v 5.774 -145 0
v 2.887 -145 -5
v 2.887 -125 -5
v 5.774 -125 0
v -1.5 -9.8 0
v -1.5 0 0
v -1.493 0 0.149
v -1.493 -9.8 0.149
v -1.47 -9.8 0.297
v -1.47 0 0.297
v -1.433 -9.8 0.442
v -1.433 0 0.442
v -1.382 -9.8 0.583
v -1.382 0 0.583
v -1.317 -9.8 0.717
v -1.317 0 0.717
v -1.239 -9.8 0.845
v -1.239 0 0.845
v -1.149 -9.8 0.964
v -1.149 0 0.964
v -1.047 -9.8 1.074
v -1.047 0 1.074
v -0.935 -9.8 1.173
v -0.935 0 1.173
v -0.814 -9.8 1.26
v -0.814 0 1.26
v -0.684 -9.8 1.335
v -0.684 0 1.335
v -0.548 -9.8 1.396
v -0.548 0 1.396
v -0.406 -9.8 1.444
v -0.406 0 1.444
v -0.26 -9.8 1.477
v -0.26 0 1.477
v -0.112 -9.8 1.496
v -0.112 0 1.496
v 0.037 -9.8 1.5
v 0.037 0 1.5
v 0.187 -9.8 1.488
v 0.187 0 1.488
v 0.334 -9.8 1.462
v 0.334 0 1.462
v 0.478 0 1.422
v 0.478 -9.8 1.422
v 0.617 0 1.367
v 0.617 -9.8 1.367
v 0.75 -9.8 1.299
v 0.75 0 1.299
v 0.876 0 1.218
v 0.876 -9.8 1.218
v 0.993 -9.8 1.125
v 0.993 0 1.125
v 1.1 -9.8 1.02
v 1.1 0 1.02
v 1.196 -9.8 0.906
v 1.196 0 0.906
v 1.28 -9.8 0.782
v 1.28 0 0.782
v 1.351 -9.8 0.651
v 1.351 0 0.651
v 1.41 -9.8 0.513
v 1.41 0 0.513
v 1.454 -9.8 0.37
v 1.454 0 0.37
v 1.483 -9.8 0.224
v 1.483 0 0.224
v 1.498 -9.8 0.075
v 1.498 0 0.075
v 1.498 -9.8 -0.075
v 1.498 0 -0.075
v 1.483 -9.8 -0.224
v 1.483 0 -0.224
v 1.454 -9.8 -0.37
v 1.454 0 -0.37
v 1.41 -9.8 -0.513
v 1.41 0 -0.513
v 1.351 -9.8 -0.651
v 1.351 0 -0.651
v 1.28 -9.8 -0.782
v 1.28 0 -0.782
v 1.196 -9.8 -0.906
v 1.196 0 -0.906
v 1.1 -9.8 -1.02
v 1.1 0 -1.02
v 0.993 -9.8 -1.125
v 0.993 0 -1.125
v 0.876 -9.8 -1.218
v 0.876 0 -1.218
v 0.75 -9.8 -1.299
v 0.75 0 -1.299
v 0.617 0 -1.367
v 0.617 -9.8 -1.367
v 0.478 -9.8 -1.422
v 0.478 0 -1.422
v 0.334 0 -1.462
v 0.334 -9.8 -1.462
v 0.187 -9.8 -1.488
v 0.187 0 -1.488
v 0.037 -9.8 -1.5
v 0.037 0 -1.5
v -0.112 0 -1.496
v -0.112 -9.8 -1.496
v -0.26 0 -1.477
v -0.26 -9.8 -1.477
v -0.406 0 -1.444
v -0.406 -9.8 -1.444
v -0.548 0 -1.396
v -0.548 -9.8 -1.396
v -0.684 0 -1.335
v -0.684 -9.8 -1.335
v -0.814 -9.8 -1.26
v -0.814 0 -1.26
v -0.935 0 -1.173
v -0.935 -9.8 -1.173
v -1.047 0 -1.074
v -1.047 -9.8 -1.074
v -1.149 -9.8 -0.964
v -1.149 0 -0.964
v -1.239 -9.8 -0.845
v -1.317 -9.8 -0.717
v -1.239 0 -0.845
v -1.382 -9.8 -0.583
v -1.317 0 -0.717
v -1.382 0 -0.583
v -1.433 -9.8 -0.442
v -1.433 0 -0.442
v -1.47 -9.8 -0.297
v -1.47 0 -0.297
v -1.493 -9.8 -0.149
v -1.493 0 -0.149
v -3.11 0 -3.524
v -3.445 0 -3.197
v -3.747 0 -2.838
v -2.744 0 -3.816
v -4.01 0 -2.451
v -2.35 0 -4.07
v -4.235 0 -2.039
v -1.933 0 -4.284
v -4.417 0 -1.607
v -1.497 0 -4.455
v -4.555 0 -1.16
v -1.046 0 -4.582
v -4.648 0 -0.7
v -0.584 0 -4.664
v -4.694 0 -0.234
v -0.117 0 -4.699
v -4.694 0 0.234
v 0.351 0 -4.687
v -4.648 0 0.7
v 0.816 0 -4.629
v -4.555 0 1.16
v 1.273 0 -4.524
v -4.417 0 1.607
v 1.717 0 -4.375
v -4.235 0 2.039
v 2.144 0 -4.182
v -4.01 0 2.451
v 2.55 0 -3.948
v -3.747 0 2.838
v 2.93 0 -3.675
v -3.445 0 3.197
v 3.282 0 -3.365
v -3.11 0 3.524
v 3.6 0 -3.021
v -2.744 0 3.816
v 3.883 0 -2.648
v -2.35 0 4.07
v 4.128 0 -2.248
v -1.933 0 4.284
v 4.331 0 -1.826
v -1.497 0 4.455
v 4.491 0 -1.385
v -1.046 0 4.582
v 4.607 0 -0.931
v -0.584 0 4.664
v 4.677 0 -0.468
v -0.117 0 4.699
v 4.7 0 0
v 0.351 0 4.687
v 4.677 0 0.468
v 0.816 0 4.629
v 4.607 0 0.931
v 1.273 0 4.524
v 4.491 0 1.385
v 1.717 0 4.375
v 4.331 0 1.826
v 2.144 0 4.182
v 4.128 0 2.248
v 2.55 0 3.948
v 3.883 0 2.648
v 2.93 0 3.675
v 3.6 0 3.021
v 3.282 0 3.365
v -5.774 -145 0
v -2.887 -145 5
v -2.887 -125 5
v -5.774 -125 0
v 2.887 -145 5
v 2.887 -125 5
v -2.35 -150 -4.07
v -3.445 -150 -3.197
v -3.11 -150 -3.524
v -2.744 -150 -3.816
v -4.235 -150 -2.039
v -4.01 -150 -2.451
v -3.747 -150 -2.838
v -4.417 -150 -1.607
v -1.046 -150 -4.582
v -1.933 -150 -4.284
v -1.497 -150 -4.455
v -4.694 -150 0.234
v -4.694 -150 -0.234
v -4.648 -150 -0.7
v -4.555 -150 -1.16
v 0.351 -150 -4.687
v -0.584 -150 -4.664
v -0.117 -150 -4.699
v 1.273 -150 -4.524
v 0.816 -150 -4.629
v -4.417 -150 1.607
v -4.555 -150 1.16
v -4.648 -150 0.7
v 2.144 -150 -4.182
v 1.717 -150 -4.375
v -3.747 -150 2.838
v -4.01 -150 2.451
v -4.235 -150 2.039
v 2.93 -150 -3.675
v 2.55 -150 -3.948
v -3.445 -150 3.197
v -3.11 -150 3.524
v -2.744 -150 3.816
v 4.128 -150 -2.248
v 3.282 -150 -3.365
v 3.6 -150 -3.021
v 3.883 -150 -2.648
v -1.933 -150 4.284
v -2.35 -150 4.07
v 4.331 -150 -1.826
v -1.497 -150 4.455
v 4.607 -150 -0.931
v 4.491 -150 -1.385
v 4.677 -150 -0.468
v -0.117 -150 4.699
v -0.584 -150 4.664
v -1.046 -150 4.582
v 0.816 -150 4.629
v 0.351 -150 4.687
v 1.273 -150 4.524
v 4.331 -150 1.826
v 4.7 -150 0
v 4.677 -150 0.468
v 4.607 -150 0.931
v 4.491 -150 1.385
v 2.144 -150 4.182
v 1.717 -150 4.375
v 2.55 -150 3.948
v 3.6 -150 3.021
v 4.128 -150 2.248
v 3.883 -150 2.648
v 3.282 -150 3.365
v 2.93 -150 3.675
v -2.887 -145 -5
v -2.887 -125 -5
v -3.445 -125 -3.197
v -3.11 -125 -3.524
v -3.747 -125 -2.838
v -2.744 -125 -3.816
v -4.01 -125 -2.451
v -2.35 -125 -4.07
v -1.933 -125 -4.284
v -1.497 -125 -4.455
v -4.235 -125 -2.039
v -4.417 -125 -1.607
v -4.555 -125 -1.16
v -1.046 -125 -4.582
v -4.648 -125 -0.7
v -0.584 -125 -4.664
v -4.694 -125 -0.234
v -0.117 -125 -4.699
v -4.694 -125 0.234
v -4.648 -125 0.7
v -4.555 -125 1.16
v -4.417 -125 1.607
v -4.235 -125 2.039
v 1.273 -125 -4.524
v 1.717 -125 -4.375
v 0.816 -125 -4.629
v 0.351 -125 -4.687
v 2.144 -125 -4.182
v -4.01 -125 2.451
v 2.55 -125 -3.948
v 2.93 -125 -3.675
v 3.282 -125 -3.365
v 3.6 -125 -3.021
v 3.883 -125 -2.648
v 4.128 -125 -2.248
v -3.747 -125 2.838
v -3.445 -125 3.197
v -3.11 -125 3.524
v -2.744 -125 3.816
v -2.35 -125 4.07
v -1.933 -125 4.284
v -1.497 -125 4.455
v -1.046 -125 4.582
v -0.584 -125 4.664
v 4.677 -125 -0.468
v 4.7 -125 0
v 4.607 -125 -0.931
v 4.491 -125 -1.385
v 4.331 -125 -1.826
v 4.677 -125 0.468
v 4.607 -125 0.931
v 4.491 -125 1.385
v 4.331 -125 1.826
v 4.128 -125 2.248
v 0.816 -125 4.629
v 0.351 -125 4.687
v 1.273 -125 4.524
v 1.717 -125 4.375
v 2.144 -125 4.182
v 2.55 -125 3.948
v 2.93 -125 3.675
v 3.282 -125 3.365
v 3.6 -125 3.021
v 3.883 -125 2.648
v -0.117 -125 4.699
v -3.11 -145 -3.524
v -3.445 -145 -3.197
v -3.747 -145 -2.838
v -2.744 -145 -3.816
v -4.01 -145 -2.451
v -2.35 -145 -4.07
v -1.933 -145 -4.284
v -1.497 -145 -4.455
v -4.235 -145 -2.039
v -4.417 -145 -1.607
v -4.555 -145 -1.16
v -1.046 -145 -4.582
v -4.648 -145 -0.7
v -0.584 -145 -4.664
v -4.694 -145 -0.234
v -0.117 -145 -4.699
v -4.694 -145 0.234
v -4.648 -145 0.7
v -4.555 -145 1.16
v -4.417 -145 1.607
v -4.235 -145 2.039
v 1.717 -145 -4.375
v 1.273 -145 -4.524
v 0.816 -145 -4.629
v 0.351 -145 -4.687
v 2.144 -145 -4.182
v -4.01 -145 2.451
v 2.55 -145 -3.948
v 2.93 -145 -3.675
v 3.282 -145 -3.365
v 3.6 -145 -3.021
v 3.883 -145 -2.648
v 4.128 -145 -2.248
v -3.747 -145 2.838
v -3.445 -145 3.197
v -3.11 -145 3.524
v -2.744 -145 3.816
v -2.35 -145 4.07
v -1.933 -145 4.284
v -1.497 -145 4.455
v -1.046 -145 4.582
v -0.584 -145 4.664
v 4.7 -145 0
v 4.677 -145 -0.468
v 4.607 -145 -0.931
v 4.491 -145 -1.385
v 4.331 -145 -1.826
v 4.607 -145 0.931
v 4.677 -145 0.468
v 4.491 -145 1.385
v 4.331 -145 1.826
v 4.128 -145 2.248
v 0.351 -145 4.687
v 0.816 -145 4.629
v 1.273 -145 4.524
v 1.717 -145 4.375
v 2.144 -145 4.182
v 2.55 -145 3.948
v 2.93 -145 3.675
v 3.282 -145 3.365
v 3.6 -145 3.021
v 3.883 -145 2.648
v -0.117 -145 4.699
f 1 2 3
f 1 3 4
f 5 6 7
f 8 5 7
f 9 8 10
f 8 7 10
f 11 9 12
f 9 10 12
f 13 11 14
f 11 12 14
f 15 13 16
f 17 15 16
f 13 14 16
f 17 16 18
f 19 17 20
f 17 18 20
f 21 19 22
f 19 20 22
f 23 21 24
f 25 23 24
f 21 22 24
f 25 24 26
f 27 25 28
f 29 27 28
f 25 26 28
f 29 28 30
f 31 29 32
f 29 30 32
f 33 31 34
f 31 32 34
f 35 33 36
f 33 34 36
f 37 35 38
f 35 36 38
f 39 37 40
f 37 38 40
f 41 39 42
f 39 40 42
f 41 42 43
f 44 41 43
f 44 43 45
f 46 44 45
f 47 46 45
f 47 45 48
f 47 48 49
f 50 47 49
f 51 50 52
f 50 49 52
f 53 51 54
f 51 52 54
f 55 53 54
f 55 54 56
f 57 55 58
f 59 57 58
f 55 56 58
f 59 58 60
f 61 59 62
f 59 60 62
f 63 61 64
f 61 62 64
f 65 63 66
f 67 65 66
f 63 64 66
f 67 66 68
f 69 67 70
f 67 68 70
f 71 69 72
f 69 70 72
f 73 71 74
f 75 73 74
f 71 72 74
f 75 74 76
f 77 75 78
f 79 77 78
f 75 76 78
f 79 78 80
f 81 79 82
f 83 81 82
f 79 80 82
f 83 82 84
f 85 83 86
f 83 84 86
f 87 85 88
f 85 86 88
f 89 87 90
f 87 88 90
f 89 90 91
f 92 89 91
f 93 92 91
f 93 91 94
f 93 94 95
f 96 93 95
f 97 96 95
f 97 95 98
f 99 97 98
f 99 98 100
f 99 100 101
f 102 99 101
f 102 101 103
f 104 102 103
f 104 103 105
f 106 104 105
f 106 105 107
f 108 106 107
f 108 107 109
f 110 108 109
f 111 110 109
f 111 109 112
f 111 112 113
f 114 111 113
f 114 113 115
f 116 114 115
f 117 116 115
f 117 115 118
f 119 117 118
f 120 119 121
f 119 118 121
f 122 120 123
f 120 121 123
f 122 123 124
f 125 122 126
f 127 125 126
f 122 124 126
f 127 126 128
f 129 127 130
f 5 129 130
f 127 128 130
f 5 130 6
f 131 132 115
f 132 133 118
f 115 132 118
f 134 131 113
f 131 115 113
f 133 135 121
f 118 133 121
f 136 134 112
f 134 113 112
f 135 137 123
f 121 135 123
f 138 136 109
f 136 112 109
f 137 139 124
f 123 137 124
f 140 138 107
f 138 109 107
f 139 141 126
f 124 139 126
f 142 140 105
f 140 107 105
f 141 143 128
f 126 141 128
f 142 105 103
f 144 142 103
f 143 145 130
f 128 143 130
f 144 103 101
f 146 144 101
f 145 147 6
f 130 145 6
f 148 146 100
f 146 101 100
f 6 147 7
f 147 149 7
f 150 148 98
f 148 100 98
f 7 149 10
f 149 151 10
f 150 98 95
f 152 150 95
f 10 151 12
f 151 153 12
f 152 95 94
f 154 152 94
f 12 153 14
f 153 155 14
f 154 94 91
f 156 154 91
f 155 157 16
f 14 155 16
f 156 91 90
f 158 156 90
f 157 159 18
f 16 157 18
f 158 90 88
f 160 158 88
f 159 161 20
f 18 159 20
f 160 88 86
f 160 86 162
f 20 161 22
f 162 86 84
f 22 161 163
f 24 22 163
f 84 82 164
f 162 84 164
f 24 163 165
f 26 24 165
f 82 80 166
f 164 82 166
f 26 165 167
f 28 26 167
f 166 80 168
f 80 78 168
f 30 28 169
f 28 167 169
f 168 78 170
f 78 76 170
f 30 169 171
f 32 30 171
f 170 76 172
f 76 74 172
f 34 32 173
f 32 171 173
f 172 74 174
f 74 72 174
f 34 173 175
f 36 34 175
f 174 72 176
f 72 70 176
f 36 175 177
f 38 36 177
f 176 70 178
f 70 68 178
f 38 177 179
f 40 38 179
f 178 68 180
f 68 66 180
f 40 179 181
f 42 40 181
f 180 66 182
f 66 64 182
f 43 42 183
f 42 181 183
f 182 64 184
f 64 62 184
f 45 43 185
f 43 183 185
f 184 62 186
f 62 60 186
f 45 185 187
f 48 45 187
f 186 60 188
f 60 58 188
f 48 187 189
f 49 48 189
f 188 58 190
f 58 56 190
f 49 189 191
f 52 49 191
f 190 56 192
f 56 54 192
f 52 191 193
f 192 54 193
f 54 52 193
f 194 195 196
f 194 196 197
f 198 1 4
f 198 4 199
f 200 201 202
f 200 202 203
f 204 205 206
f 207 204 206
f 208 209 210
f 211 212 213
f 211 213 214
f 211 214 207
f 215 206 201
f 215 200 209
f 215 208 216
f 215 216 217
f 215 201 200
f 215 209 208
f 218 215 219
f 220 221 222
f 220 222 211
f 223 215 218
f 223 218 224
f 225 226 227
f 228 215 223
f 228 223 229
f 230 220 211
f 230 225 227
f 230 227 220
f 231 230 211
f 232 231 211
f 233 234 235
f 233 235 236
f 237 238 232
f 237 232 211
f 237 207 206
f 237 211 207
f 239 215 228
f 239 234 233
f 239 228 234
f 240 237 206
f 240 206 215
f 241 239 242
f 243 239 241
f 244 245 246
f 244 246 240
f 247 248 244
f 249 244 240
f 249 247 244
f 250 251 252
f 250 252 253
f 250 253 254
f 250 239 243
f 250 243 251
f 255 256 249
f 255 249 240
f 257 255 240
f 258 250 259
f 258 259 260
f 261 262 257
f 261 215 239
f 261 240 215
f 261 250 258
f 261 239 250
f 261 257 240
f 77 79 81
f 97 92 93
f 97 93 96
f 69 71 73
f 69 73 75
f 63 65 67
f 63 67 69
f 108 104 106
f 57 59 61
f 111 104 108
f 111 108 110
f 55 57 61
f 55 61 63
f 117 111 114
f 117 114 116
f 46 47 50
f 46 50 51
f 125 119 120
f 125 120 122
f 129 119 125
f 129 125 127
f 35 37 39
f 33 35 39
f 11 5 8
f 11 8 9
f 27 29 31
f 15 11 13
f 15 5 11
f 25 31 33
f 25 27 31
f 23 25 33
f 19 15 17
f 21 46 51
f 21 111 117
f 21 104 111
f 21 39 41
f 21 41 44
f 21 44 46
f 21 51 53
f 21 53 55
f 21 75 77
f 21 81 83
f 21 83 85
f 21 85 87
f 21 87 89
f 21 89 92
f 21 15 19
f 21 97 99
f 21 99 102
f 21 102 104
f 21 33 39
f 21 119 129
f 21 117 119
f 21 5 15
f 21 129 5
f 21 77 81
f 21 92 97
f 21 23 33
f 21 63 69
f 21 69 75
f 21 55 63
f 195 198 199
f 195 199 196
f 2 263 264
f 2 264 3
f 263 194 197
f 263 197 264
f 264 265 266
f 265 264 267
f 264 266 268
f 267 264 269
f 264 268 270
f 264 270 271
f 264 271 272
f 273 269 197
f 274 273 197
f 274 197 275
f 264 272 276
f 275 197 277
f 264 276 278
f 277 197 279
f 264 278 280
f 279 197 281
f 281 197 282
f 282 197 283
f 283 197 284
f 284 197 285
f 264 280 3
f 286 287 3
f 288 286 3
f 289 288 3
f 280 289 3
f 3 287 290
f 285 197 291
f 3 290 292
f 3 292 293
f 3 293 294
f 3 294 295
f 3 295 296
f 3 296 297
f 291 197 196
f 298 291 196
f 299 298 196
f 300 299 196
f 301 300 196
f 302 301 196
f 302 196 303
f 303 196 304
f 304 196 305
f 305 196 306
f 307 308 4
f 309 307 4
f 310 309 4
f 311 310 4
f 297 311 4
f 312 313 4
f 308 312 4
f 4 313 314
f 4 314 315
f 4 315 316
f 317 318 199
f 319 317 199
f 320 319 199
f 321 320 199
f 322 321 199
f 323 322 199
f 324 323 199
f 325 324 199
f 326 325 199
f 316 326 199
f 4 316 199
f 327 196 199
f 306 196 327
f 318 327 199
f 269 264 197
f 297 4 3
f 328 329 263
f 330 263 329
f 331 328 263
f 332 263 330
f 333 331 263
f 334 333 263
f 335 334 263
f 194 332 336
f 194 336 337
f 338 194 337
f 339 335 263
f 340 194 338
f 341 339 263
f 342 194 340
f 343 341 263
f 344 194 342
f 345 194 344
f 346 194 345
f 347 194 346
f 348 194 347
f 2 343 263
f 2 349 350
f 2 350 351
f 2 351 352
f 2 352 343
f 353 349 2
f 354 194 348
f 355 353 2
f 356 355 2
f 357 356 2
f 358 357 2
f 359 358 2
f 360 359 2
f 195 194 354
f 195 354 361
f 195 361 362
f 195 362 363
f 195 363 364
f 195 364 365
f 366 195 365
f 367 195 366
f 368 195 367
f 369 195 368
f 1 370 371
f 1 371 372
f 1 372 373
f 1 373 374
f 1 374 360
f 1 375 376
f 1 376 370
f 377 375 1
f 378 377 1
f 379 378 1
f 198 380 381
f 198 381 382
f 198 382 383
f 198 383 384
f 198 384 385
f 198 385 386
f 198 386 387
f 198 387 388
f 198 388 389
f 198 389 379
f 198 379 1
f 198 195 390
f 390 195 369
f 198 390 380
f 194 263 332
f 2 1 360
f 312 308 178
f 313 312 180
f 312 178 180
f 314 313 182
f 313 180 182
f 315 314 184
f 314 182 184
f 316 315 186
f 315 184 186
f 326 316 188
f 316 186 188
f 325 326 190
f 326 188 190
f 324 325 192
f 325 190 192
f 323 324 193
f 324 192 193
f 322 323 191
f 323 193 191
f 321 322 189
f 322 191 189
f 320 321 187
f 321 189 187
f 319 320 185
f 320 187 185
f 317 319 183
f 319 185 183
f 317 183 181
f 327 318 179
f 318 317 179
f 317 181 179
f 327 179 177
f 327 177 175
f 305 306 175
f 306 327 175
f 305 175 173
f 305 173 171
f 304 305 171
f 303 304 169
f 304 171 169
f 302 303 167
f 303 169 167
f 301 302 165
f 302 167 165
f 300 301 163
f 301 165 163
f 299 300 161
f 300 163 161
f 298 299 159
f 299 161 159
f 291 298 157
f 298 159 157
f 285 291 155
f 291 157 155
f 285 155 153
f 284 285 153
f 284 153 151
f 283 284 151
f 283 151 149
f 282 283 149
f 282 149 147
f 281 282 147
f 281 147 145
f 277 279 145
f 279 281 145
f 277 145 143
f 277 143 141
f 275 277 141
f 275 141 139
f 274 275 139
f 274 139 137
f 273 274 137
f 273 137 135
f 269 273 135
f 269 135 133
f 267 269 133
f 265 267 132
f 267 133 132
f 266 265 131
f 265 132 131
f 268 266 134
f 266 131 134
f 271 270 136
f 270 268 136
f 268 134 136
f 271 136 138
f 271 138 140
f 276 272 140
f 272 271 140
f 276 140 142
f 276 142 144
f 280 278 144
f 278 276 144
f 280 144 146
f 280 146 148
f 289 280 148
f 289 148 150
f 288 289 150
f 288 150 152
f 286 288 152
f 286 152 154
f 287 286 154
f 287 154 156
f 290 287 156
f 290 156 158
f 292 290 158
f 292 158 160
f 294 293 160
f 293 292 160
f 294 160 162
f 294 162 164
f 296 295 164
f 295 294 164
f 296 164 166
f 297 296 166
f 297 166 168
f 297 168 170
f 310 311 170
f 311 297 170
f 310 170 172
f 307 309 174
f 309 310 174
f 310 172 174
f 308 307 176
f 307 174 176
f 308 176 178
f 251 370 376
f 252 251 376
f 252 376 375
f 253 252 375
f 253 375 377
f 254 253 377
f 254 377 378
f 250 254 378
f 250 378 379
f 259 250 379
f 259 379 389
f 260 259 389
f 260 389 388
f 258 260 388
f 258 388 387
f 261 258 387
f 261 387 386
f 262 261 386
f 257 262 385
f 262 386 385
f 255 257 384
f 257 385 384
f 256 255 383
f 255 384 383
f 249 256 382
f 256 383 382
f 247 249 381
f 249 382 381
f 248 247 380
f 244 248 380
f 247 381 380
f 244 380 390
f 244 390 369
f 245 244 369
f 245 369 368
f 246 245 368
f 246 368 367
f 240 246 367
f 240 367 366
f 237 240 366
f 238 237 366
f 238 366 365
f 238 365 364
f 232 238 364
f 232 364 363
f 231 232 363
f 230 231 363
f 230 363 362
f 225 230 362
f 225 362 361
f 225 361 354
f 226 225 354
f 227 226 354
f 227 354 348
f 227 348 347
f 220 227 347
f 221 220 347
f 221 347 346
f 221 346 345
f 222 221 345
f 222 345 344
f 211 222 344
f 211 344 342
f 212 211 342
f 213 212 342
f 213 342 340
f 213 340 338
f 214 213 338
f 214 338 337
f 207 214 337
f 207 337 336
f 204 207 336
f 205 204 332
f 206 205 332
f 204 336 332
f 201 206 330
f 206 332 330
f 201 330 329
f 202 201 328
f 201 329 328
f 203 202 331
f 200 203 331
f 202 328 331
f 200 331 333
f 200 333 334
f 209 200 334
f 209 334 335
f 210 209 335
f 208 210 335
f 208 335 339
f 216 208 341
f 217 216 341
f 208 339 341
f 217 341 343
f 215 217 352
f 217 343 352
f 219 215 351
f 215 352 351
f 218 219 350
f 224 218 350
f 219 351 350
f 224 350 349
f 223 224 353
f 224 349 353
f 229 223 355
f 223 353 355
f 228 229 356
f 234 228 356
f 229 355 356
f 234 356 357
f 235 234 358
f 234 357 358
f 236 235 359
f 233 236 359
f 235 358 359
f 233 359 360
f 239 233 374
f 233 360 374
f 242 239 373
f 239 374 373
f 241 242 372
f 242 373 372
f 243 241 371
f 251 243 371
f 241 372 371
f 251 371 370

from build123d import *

# Parameters (mm, degrees)
F0_R     = 4.7
F1_DEPTH = 150
F2_R     = 1.5
F3_DEPTH = 9.8
F6_DEPTH = 20


with BuildPart() as f1:
    # F0 (on Front) → F1 (new body)
    with BuildSketch(Plane.XZ):
        Circle(F0_R)
    extrude(amount=F1_DEPTH)

    # F2 (on face) → F3 (cut)
    with BuildSketch(Plane(origin=(0, 0, 0), x_dir=(-1, 0, 0), z_dir=(0, 1, 0))):
        Circle(F2_R)
    extrude(amount=-F3_DEPTH, mode=Mode.SUBTRACT)

    # F5 (on offset) → F6 (join)
    with BuildSketch(Plane.XZ.offset(145)):
        Polygon((2.887, 5.000431), (-2.887, 5.000431), (-5.774, 0), (-2.887, -5.000431), (2.887, -5.000431), (5.774, 0), align=None)
    extrude(amount=-F6_DEPTH)


solid = f1.part
